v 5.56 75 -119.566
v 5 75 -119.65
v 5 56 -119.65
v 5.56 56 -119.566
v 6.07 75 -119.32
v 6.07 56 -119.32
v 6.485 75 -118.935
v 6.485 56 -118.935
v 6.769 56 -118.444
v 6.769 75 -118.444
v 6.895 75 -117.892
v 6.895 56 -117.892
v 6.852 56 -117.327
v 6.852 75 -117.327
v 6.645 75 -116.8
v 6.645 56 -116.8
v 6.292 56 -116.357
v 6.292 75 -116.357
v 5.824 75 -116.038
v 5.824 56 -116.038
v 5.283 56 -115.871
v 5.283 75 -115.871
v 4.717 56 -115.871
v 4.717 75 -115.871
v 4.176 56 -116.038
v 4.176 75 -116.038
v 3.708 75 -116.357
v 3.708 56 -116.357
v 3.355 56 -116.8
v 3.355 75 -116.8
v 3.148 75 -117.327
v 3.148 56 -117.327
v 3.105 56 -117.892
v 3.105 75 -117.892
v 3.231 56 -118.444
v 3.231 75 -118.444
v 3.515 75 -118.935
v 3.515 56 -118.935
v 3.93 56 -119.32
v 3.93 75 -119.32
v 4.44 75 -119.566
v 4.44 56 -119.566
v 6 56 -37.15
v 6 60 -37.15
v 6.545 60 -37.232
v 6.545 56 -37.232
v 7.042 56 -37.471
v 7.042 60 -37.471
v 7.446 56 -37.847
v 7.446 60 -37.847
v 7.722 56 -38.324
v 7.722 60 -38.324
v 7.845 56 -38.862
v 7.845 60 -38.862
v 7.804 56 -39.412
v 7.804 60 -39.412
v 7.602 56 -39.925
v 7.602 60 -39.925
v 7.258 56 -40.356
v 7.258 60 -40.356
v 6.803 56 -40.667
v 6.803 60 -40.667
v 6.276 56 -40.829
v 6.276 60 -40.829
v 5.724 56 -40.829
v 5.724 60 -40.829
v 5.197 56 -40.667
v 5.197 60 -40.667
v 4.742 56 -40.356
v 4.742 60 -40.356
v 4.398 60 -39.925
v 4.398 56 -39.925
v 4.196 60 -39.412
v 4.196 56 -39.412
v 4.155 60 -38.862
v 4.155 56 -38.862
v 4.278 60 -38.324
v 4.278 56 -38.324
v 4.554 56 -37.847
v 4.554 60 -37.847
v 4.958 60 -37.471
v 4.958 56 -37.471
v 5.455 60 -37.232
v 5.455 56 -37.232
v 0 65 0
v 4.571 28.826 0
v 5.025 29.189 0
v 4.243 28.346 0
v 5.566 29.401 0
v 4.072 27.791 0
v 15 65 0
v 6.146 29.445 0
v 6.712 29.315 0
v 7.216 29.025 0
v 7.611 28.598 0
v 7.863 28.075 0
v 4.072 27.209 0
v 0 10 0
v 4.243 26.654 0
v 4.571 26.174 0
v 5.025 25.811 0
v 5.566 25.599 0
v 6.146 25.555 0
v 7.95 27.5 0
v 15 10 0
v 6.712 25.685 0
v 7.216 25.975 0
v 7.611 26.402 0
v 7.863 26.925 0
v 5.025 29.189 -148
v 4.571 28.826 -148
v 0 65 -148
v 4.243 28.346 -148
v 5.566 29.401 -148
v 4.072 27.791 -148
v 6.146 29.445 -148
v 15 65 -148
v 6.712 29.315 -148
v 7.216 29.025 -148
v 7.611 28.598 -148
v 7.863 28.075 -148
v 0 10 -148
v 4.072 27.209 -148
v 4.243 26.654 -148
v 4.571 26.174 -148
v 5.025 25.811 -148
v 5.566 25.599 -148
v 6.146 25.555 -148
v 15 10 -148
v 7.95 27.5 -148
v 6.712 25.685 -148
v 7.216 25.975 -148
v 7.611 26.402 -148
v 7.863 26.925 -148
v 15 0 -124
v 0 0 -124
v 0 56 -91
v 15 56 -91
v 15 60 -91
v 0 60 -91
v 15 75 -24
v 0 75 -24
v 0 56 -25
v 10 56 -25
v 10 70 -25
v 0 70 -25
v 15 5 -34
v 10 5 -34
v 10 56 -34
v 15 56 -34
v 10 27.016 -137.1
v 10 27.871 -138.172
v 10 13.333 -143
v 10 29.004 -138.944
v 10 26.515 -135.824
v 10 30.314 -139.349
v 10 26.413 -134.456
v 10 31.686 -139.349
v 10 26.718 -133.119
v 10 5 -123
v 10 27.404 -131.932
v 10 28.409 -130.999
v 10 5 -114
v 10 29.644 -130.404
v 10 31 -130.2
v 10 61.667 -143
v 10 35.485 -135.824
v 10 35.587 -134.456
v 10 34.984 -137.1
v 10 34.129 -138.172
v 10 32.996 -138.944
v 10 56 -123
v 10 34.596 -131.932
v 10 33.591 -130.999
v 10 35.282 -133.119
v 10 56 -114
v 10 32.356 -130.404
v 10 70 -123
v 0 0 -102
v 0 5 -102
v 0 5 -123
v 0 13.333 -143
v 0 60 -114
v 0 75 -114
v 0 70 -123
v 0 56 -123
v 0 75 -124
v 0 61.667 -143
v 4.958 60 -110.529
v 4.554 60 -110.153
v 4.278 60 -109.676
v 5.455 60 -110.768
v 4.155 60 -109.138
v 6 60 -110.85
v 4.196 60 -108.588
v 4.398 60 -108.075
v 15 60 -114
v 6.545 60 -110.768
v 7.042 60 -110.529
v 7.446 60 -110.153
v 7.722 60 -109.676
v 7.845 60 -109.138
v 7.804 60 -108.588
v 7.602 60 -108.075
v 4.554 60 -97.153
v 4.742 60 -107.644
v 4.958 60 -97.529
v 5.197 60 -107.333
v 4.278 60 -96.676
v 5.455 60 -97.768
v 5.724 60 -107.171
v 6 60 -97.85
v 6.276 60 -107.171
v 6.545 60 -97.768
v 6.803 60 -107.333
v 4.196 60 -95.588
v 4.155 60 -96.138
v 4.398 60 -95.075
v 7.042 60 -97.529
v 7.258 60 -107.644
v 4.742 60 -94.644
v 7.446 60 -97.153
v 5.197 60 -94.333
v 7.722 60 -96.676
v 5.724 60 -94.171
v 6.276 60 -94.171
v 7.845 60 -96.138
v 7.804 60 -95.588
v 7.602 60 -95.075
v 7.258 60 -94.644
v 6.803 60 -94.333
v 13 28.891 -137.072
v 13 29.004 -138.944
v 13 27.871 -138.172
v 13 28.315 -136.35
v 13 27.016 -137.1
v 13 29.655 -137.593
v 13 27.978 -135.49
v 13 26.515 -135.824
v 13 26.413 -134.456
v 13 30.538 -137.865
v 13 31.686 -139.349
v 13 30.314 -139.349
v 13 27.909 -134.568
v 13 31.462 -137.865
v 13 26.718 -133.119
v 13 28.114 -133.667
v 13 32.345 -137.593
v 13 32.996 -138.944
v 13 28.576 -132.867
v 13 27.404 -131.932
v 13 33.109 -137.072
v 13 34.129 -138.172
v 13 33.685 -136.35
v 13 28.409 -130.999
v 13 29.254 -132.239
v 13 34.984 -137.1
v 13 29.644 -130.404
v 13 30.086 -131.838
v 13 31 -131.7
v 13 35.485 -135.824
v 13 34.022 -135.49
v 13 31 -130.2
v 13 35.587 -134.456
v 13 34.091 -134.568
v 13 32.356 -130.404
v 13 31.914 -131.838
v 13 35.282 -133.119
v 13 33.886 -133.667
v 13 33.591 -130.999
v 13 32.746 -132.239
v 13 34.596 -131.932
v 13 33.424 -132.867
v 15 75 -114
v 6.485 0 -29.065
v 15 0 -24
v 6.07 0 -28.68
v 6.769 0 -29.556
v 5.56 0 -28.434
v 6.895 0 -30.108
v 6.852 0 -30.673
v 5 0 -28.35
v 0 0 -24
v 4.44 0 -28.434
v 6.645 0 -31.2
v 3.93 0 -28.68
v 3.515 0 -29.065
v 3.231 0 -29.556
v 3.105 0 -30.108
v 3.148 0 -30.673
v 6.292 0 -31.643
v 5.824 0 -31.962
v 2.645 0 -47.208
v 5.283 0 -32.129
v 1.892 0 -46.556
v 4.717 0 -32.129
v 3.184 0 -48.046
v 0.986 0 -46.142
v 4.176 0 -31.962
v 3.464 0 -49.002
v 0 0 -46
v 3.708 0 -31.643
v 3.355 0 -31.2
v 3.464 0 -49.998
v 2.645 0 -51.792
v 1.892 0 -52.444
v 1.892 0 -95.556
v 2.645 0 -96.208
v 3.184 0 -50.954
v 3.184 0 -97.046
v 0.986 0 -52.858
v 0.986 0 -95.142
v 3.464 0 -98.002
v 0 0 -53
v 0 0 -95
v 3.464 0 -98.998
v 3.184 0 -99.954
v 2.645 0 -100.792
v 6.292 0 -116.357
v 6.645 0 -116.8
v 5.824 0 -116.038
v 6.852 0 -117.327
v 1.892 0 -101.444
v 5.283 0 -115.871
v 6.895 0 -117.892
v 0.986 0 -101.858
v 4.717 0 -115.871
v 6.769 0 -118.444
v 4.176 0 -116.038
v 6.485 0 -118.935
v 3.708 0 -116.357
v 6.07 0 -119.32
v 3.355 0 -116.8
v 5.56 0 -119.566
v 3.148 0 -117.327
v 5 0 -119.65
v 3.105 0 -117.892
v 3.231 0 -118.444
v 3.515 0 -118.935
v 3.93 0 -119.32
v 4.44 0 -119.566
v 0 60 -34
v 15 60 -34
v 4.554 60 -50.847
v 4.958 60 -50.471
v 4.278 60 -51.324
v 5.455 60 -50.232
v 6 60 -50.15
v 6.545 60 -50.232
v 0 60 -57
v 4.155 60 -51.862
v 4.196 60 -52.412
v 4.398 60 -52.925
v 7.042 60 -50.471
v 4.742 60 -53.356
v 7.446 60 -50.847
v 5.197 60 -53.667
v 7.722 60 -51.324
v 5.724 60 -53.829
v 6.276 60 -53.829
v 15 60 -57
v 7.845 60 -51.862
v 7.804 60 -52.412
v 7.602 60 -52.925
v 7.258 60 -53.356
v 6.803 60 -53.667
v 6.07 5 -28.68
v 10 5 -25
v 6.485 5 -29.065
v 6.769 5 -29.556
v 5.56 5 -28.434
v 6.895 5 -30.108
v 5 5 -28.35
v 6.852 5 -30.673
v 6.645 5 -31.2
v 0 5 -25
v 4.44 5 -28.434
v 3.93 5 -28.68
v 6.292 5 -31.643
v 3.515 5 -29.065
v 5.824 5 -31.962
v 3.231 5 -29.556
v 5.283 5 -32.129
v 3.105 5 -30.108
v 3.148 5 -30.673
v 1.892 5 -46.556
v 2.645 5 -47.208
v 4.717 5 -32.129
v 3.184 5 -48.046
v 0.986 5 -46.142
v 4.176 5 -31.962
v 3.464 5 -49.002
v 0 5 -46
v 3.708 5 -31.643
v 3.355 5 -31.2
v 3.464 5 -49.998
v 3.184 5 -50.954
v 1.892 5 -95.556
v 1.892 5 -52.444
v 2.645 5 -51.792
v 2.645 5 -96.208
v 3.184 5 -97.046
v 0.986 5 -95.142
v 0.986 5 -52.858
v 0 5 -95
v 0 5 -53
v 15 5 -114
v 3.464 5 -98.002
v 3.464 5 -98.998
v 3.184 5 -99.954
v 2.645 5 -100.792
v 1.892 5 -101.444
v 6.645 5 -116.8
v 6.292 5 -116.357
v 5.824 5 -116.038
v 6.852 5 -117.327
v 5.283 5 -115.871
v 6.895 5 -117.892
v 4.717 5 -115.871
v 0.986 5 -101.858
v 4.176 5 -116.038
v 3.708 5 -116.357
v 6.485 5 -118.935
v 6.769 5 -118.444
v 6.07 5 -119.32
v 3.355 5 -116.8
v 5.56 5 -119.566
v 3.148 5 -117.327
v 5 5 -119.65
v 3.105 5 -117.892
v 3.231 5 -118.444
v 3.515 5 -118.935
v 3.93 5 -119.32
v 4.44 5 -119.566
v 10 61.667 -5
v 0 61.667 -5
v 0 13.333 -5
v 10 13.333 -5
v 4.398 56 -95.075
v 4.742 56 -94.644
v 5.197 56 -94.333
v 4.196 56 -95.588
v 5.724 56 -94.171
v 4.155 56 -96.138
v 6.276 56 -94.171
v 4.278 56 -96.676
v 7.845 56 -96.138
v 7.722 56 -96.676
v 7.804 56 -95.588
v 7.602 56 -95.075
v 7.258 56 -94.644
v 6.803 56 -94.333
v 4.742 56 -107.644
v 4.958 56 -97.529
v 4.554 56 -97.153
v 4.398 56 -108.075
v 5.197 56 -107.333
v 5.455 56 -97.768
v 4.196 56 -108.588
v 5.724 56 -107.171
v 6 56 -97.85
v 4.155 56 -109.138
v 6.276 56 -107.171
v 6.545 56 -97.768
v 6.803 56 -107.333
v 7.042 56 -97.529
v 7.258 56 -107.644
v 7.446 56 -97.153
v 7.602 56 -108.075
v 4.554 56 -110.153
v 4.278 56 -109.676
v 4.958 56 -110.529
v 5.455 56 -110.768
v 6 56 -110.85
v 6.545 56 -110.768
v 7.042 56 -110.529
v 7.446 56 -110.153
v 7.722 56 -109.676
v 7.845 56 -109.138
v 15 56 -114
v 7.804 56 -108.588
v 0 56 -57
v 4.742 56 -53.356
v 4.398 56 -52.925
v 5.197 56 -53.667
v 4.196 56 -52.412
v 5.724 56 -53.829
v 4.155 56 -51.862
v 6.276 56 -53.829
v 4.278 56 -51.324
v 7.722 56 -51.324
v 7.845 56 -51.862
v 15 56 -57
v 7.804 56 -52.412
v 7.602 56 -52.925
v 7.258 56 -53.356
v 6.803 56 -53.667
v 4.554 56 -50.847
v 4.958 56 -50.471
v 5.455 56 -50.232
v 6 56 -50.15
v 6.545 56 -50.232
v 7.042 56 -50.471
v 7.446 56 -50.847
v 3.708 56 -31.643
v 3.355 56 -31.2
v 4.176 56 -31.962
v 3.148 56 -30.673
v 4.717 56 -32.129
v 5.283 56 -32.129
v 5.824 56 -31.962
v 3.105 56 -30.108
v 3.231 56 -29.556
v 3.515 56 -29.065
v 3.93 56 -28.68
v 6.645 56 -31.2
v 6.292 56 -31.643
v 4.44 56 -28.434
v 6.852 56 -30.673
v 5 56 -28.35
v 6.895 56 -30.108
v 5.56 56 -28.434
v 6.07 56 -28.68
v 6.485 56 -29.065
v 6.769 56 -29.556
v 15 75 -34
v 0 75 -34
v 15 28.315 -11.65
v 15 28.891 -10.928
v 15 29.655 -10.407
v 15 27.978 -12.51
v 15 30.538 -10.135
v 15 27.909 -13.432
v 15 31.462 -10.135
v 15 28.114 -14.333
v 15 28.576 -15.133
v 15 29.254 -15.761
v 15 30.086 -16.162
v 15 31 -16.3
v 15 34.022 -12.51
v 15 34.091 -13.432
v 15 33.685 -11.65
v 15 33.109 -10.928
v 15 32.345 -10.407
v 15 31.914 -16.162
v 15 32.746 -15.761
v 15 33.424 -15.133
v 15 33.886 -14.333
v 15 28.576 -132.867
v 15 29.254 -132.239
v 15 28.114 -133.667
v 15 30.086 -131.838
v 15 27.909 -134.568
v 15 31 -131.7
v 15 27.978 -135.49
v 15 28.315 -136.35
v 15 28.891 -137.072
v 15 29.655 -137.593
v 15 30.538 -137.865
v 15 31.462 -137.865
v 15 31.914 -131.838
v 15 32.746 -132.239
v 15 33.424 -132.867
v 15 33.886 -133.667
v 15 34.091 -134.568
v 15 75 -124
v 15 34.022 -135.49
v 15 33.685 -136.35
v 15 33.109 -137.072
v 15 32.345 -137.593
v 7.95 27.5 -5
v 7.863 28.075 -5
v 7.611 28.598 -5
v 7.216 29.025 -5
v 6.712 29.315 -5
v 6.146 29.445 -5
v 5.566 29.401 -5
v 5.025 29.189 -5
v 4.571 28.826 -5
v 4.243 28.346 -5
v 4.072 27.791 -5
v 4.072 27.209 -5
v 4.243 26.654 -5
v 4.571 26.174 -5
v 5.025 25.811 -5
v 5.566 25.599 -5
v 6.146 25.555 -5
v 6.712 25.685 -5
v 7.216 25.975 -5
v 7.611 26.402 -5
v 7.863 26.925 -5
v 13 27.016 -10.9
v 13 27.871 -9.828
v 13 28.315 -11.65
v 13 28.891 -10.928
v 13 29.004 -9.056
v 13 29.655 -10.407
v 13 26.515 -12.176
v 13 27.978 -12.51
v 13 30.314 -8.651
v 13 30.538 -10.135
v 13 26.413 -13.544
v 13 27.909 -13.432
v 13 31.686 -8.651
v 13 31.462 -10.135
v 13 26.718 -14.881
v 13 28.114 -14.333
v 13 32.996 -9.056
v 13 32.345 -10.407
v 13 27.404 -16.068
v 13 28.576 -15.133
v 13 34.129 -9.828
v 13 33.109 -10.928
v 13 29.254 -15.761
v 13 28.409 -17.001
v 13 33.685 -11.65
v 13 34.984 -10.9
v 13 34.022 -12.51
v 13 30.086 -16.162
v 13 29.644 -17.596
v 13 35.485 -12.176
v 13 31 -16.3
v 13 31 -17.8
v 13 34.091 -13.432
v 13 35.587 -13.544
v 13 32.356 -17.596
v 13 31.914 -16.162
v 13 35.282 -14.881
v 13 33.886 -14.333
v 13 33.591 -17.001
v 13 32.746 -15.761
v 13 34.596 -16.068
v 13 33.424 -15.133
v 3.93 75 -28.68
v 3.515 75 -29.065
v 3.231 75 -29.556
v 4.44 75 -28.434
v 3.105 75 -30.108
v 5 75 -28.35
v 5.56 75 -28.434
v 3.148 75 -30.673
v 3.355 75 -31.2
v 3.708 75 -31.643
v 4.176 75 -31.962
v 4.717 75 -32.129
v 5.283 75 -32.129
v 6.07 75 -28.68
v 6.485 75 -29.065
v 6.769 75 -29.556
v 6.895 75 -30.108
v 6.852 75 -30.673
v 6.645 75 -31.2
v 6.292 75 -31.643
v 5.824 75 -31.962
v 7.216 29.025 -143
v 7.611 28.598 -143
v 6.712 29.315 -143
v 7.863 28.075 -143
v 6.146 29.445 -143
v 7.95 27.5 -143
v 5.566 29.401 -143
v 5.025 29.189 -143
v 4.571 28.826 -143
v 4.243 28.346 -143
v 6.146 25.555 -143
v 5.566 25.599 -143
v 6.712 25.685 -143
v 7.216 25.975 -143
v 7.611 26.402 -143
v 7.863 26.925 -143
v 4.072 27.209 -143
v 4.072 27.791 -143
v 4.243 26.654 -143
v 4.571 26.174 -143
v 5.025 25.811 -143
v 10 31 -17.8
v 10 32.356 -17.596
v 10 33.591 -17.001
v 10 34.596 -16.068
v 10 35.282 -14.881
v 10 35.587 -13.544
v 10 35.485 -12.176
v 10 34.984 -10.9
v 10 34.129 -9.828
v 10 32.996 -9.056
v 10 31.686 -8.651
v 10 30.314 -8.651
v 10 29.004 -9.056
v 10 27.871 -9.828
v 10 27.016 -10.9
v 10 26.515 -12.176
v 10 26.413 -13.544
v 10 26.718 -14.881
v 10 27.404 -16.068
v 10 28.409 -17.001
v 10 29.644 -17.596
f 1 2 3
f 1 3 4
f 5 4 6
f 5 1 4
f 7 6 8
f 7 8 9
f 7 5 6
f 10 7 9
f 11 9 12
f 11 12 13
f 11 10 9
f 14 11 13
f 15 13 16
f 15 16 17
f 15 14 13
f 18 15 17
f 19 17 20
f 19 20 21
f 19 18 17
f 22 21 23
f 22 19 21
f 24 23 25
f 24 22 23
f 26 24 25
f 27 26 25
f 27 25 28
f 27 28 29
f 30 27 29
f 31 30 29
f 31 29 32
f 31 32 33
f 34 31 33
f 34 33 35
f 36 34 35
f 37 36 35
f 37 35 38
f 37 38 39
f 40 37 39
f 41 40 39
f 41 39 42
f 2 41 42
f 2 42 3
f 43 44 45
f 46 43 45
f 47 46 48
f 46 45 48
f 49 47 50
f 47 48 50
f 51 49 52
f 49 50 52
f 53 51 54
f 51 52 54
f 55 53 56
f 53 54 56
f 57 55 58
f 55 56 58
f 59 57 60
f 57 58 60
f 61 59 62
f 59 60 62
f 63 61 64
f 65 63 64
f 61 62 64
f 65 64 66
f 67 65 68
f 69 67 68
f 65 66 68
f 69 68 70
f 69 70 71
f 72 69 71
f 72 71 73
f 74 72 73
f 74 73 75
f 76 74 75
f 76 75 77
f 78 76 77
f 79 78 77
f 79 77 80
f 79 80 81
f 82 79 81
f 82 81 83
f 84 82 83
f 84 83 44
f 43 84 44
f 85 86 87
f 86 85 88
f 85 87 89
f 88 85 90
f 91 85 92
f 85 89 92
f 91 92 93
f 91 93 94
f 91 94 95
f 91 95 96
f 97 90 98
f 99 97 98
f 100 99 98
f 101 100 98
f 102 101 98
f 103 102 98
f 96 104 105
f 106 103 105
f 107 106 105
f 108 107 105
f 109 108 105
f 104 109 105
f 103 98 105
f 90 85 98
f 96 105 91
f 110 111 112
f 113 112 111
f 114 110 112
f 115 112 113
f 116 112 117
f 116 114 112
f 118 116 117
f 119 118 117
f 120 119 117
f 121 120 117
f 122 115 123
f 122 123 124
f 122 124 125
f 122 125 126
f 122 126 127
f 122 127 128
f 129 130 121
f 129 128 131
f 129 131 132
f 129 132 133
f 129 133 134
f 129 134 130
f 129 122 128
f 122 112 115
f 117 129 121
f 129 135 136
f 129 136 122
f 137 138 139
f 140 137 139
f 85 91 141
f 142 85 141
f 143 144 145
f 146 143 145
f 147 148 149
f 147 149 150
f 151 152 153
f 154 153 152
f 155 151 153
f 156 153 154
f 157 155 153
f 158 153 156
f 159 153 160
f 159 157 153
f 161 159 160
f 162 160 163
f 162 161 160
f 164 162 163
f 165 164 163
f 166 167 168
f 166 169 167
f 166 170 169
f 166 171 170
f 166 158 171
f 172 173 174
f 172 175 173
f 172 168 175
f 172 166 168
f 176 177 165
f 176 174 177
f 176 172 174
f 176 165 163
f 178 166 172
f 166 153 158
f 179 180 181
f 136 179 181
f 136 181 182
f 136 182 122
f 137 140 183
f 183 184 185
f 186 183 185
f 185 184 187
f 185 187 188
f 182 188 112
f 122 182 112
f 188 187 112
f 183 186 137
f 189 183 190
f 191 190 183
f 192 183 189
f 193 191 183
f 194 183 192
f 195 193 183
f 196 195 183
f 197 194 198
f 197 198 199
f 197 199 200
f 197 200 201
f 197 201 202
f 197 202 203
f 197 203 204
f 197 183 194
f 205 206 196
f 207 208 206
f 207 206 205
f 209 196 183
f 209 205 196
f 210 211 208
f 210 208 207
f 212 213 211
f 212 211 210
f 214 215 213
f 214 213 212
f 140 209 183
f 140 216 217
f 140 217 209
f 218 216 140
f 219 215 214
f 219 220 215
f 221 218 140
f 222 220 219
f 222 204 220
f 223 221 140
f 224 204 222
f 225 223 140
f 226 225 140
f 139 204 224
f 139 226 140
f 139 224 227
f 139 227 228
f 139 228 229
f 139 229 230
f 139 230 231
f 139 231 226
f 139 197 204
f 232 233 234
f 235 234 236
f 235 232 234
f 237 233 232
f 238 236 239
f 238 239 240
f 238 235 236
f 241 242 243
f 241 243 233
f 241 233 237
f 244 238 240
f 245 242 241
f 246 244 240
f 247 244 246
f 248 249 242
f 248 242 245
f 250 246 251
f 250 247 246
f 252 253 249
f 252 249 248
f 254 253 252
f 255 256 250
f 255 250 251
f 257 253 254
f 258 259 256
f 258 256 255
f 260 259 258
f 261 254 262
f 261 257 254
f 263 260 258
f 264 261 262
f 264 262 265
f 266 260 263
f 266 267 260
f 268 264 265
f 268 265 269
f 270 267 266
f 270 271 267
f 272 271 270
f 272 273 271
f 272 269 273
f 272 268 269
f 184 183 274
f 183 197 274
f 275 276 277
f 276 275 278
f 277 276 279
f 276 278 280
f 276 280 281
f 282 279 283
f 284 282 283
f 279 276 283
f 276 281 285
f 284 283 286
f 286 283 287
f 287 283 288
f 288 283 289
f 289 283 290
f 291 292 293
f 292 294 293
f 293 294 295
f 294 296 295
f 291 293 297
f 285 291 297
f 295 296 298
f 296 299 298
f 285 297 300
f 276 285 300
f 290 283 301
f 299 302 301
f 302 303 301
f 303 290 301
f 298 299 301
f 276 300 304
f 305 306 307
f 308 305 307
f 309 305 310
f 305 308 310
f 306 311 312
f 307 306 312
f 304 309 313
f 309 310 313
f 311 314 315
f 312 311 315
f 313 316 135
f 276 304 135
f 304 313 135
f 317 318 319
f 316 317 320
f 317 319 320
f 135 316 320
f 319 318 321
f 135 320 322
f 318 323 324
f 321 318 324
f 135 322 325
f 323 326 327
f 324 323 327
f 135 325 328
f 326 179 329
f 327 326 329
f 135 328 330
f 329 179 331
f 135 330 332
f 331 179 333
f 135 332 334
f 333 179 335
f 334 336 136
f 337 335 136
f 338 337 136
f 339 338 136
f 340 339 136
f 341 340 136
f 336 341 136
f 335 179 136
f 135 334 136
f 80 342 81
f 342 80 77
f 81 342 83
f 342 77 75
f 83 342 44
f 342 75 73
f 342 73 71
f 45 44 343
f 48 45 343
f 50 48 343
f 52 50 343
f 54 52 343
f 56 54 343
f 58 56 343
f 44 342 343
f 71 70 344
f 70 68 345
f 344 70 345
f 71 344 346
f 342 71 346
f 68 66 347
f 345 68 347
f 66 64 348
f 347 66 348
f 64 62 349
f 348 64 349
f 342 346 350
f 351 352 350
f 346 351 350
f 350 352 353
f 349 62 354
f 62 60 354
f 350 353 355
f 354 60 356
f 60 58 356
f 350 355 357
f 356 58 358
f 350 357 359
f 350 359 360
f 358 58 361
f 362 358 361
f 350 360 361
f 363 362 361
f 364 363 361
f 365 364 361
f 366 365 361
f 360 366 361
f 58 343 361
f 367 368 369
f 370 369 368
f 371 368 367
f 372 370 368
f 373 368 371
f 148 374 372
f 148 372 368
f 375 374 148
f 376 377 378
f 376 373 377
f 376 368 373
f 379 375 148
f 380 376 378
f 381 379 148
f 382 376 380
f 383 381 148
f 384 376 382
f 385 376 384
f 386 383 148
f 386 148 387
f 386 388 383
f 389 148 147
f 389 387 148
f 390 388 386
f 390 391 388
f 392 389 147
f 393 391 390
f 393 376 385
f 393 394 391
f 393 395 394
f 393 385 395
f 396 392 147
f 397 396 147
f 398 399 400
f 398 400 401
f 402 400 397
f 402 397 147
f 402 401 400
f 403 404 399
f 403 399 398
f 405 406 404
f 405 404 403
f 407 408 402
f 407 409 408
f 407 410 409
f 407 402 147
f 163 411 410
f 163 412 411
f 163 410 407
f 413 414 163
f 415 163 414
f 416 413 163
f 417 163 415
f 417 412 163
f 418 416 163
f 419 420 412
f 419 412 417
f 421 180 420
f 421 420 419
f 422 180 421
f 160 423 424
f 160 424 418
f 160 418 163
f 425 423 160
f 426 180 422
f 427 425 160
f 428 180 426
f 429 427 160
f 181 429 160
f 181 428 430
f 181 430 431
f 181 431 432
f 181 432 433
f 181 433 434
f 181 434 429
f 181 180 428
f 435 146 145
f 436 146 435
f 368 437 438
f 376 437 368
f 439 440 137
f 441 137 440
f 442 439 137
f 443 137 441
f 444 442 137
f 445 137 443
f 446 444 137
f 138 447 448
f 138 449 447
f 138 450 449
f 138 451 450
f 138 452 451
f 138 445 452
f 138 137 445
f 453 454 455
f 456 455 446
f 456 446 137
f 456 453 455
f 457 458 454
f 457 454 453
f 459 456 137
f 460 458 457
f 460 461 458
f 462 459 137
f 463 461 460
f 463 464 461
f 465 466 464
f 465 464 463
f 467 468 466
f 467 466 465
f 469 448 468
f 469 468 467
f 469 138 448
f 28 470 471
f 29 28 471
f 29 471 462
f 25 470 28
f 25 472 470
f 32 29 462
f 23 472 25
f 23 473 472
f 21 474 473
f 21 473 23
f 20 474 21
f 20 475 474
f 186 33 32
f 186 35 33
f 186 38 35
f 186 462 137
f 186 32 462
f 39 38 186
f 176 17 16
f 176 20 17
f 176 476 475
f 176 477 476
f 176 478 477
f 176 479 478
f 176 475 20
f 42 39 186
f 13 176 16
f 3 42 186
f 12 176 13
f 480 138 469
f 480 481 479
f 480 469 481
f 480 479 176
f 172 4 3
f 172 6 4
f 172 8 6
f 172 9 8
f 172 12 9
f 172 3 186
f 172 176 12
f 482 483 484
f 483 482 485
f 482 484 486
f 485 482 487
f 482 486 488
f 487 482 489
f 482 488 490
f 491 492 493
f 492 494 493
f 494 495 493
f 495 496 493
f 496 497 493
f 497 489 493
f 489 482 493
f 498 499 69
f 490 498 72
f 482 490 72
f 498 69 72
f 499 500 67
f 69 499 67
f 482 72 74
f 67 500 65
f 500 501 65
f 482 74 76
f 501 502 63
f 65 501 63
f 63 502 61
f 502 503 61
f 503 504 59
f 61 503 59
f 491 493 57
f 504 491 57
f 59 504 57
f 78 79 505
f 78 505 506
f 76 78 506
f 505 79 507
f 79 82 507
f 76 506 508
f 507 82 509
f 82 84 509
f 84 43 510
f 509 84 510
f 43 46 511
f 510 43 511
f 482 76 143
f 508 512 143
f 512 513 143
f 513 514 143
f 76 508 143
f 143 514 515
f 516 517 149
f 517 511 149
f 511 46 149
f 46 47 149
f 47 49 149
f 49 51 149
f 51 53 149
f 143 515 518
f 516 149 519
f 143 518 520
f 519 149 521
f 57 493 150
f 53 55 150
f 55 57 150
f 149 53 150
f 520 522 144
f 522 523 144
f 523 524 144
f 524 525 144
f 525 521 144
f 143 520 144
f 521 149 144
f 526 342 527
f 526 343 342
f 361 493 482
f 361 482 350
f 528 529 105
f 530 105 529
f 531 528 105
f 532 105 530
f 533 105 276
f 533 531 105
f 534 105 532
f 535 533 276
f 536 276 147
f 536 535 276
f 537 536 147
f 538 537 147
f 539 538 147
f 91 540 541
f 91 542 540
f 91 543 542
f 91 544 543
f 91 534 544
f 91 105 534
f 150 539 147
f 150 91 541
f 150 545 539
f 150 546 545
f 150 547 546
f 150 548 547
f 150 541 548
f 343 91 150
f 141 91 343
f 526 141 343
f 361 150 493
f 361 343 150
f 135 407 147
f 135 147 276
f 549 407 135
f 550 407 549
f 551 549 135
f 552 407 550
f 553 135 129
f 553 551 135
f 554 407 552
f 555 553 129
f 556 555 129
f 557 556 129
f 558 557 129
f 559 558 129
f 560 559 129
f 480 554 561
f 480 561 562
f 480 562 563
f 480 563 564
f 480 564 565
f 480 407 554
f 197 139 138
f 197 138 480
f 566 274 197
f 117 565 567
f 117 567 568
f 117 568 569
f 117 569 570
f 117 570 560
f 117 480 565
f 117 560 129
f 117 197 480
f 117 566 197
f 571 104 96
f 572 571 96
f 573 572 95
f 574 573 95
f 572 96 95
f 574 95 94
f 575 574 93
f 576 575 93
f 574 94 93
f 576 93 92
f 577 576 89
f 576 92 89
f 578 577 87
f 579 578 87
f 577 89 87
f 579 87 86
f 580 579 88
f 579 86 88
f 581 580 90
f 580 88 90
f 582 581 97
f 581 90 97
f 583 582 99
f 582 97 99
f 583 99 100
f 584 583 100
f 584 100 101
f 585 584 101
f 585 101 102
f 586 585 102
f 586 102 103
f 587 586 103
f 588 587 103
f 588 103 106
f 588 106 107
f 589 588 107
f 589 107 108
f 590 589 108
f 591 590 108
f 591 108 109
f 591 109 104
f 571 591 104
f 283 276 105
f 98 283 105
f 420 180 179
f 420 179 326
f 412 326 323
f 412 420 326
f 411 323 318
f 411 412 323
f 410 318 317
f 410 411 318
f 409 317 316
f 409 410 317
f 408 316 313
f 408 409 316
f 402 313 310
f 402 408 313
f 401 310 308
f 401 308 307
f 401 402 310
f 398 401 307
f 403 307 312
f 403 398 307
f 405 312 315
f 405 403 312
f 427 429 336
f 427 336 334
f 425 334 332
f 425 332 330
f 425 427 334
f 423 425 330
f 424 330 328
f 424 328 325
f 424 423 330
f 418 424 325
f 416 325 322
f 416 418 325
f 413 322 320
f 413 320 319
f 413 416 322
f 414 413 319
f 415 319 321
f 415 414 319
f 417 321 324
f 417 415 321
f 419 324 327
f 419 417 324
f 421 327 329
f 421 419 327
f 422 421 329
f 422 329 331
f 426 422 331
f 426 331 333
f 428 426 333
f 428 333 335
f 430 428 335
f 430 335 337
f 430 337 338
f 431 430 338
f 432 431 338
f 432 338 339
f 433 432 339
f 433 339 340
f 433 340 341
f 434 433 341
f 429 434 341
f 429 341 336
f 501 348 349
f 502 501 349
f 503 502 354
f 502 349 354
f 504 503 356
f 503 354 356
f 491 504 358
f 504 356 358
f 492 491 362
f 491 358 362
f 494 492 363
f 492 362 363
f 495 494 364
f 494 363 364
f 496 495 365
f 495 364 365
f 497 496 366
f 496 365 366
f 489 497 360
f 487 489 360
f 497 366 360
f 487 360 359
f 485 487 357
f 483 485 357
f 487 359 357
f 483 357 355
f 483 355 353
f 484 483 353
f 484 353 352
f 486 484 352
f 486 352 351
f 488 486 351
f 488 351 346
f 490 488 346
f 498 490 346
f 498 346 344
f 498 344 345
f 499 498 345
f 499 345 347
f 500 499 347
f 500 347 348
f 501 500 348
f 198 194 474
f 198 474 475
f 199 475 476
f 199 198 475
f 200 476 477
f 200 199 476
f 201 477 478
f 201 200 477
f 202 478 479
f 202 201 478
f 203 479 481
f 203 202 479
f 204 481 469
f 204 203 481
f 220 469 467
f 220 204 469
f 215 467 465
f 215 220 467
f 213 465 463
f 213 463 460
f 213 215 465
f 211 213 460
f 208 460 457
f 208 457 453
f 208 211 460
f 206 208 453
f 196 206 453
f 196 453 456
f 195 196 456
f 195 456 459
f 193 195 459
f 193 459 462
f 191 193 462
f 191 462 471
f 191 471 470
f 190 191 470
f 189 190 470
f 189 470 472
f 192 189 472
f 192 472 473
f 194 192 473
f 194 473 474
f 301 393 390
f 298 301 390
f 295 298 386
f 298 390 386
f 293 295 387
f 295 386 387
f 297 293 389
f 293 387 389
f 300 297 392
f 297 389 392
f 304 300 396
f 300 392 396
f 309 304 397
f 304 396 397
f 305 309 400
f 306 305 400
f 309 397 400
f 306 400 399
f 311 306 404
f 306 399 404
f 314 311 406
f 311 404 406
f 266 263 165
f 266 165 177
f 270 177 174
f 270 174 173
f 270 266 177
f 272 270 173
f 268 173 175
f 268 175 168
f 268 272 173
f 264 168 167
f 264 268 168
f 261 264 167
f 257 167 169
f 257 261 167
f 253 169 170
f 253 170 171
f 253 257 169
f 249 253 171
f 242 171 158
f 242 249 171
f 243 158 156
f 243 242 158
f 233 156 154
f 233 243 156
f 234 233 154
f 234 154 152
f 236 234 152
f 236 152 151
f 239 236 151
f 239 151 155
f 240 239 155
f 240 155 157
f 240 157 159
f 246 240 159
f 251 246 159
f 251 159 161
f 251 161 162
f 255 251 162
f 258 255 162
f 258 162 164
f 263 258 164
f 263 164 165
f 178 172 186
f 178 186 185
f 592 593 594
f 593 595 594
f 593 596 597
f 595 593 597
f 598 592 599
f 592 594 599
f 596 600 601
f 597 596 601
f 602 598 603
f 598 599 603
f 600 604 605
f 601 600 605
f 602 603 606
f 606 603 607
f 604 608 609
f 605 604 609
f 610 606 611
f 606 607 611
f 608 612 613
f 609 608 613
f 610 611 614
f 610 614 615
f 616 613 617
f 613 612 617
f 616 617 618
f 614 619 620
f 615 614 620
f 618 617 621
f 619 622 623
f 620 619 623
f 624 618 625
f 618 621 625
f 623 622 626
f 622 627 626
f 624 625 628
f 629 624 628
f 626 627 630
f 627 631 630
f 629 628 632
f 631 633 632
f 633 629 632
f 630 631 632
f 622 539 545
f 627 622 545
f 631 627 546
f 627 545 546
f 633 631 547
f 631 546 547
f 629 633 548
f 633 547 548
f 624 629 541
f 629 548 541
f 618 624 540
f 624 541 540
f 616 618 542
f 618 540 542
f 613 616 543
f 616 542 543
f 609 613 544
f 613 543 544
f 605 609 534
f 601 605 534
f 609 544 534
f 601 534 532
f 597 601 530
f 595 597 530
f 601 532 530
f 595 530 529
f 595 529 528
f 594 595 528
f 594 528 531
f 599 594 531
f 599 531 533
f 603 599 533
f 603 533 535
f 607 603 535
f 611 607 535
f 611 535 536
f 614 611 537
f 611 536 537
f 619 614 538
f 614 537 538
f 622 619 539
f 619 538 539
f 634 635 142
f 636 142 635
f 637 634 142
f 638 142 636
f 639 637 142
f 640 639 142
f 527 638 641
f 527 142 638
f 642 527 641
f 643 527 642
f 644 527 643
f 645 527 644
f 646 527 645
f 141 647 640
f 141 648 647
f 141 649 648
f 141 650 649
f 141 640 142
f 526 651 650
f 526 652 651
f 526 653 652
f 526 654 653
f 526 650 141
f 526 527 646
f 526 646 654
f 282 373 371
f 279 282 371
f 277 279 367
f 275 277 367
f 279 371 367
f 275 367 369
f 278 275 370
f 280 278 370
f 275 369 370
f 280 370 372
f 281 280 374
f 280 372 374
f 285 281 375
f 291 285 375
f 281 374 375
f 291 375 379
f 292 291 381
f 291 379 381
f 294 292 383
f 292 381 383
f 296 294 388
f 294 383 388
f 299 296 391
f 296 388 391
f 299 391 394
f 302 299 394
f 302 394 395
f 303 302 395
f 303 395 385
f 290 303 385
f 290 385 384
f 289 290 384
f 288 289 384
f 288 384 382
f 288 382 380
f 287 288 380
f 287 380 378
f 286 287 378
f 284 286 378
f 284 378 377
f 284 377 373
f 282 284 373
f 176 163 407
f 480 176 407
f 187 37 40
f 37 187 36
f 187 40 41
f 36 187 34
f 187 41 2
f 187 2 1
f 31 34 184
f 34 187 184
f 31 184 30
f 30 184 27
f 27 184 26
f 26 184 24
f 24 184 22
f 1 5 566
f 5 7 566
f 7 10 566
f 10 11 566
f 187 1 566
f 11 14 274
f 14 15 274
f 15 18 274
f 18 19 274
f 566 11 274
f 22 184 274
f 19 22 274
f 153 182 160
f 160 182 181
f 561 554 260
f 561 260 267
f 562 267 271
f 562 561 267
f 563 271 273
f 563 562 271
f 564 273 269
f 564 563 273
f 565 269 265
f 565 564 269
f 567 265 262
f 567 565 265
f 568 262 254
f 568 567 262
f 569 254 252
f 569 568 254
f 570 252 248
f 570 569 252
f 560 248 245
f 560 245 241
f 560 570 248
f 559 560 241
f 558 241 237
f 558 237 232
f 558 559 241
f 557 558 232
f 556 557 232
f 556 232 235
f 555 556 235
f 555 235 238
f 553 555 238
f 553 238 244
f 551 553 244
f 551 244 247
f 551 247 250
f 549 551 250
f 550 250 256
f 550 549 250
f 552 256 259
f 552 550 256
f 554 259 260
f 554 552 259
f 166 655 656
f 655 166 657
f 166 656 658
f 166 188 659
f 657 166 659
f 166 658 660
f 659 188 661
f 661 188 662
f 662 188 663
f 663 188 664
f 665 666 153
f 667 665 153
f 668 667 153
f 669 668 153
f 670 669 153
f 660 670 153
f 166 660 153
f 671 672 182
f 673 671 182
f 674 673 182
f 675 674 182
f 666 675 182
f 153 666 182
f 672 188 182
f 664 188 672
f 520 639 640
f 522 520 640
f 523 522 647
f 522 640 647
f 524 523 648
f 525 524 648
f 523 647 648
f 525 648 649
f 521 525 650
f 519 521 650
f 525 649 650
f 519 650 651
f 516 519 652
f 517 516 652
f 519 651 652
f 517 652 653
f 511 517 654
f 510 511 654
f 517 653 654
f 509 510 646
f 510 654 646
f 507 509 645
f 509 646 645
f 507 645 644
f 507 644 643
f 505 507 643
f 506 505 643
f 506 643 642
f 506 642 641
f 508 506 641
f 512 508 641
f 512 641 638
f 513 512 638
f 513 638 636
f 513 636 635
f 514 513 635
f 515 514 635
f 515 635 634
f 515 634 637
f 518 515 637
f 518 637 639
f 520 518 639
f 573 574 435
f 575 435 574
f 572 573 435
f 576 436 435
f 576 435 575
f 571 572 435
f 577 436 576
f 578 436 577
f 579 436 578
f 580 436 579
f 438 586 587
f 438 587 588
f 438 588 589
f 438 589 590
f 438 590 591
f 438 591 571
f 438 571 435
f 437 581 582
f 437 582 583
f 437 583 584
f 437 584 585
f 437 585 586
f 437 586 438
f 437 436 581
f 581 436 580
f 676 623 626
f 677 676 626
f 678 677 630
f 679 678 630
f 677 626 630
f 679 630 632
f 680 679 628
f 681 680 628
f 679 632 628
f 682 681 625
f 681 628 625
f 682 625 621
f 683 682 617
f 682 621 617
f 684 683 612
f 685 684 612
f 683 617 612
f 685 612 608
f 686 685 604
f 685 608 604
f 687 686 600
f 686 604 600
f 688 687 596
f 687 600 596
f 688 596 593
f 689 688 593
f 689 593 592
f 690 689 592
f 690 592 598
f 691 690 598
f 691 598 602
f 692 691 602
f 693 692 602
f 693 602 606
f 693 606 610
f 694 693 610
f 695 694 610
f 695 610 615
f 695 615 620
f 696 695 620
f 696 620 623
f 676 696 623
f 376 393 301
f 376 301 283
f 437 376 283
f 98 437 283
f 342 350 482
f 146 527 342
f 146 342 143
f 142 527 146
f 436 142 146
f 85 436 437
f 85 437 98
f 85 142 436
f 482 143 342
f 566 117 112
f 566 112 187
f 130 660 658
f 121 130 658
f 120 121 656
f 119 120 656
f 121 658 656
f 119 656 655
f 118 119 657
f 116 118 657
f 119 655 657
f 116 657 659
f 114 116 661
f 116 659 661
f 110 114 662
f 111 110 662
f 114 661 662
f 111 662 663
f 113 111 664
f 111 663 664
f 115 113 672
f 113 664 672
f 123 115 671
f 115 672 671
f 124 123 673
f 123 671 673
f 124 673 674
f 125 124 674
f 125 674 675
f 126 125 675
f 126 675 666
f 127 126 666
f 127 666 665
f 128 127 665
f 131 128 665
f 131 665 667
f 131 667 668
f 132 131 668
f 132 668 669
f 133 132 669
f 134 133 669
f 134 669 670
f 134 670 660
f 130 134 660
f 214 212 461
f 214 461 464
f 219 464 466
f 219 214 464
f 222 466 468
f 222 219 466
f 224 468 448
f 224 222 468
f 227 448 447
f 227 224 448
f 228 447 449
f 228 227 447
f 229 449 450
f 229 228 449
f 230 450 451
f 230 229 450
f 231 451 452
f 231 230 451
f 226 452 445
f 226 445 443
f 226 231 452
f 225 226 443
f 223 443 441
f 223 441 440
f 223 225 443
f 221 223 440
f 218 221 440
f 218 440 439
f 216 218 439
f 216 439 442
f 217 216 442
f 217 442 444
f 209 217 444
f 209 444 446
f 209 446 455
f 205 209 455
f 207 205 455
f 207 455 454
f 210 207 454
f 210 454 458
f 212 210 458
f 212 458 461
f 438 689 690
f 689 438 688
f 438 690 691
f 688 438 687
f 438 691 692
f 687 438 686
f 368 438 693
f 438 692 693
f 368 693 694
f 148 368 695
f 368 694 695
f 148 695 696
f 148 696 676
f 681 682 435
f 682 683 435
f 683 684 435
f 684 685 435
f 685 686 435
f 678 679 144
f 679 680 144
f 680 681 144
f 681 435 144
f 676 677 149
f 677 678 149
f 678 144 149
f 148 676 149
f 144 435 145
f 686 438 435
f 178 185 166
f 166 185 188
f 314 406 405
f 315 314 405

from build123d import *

# Parameters (mm, degrees)
SKETCH1_W           = 15
SKETCH1_H           = 34
BOSS_EXTRUDE1_DEPTH = 75
CUT_EXTRUDE5_DEPTH  = 15
CUT_EXTRUDE6_START  = -15
CUT_EXTRUDE6_DEPTH  = 10
SKETCH13_W          = 23
SKETCH13_H          = 4
BOSS_EXTRUDE4_DEPTH = 15
SKETCH14_R          = 1.85
CUT_EXTRUDE8_DEPTH  = 85.107074613
SKETCH15_W          = 9
SKETCH15_H          = 14
BOSS_EXTRUDE5_DEPTH = 10
CUT_EXTRUDE4_REACH  = 97.389
SKETCH5_R           = 1.9
SKETCH11_R          = 4.6
CUT_EXTRUDE7_DEPTH  = 10
SKETCH12_R          = 4.6
SKETCH12_R_2        = 3.1
BOSS_EXTRUDE3_DEPTH = 2
SKETCH20_W          = 40
SKETCH20_H          = 5
BOSS_EXTRUDE8_DEPTH = 15
SKETCH21_R          = 3.5
CUT_EXTRUDE11_DEPTH = 103.961157725
SKETCH22_R          = 1.95
CUT_EXTRUDE12_DEPTH = 167.595318061


with BuildPart() as part:
    # Sketch1 → Boss-Extrude1 (new body)
    with BuildSketch(Plane(origin=(0, 0, 0), x_dir=(1, 0, 0), z_dir=(0, 1, 0))):
        with Locations((7.5, 17)):
            Rectangle(SKETCH1_W, SKETCH1_H)
    extrude(amount=BOSS_EXTRUDE1_DEPTH)

    # Sketch2 → Cut-Extrude5 (cut)
    with BuildSketch(Plane(origin=(15, 0, 0), x_dir=(0, 0, -1), z_dir=(1, 0, 0))):
        Polygon((0, 75), (0, 65), (24, 75), align=None)
        Polygon((0, 0), (24, 0), (0, 10), align=None)
    extrude(amount=-CUT_EXTRUDE5_DEPTH, mode=Mode.SUBTRACT)

    # Sketch2<5> → Cut-Extrude6 (cut)
    with BuildSketch(Plane(origin=(15, 0, 0), x_dir=(0, 0, -1), z_dir=(1, 0, 0)).offset(CUT_EXTRUDE6_START)):
        Polygon((25, 5), (34, 5), (34, 70), (25, 70), (5, 61.666666667), (5, 13.333333333), align=None)
    extrude(amount=CUT_EXTRUDE6_DEPTH, mode=Mode.SUBTRACT)

    # Sketch13 → Boss-Extrude4 (add)
    with BuildSketch(Plane(origin=(15, 0, 0), x_dir=(0, 0, -1), z_dir=(1, 0, 0))):
        with Locations((45.5, 58)):
            Rectangle(SKETCH13_W, SKETCH13_H)
    extrude(amount=-BOSS_EXTRUDE4_DEPTH)

    # Sketch14 → Cut-Extrude8 (cut, through all)
    with BuildSketch(Plane(origin=(0, 60, 0), x_dir=(1, 0, 0), z_dir=(0, 1, 0))):
        with Locations(Location((6, 39, 0), (0, 0, 270))):
            Circle(SKETCH14_R)
        with Locations(Location((6, 52, 0), (0, 0, 270))):
            Circle(SKETCH14_R)
    extrude(amount=-CUT_EXTRUDE8_DEPTH, mode=Mode.SUBTRACT)

    # Sketch15 → Boss-Extrude5 (add)
    with BuildSketch(Plane.ZY.offset(-10)):
        with Locations((-29.5, 63)):
            Rectangle(SKETCH15_W, SKETCH15_H)
    extrude(amount=BOSS_EXTRUDE5_DEPTH)

    # Cut-Extrude4: up to this face of the body (flat: up to its plane)
    cut_extrude4_end = Plane(part.part.faces().sort_by_distance((7.5, 0, -29))[0])
    # Sketch5 → Cut-Extrude4 (cut, up to the picked face)
    with BuildSketch(Plane(origin=(0, 75, 0), x_dir=(1, 0, 0), z_dir=(0, 1, 0)), mode=Mode.PRIVATE) as cut_extrude4_sk1:
        with Locations(Location((5, 30.25, 0), (0, 0, 270))):
            Circle(SKETCH5_R)
    cut_extrude4_tool1 = split(extrude(cut_extrude4_sk1.sketch, amount=-CUT_EXTRUDE4_REACH, mode=Mode.PRIVATE), bisect_by=cut_extrude4_end, keep=Keep.BOTH, mode=Mode.PRIVATE)
    add(cut_extrude4_tool1.solids().sort_by(Axis((5, 75, -30.25), (0, -1, 0)))[0], mode=Mode.SUBTRACT)

    # Sketch11 → Cut-Extrude7 (cut)
    with BuildSketch(Plane(origin=(15, 0, 0), x_dir=(0, 0, -1), z_dir=(1, 0, 0))):
        with Locations((13.2, 31)):
            Circle(SKETCH11_R)
    extrude(amount=-CUT_EXTRUDE7_DEPTH, mode=Mode.SUBTRACT)

    # Sketch12 → Boss-Extrude3 (add)
    with BuildSketch(Plane(origin=(15, 0, 0), x_dir=(0, 0, -1), z_dir=(1, 0, 0))):
        with Locations((13.2, 31)):
            Circle(SKETCH12_R)
        with Locations((13.2, 31)):
            Circle(SKETCH12_R_2, mode=Mode.SUBTRACT)
    extrude(amount=-BOSS_EXTRUDE3_DEPTH)

    # Sketch20 → Boss-Extrude8 (add)
    with BuildSketch(Plane.ZY):
        with Locations((-54, 2.5)):
            Rectangle(SKETCH20_W, SKETCH20_H)
    extrude(amount=-BOSS_EXTRUDE8_DEPTH)

    # Sketch21 → Cut-Extrude11 (cut, through all)
    with BuildSketch(Plane(origin=(0, 5, 0), x_dir=(1, 0, 0), z_dir=(0, 1, 0))):
        with Locations((0, 49.5)):
            Circle(SKETCH21_R)
    extrude(amount=-CUT_EXTRUDE11_DEPTH, mode=Mode.SUBTRACT)

    # Mirror3: part across plane


with BuildPart() as part_1:
    add(part.part)
    add(part.part.mirror(Plane(origin=(55.311288741, 0, -74), x_dir=(1, 0, 0), z_dir=(0, 0, -1))))

    # Sketch22 → Cut-Extrude12 (cut, through all)
    with BuildSketch(Plane.XY):
        with Locations((6, 27.5)):
            Circle(SKETCH22_R)
    extrude(amount=-CUT_EXTRUDE12_DEPTH, mode=Mode.SUBTRACT)


solid = part_1.part
